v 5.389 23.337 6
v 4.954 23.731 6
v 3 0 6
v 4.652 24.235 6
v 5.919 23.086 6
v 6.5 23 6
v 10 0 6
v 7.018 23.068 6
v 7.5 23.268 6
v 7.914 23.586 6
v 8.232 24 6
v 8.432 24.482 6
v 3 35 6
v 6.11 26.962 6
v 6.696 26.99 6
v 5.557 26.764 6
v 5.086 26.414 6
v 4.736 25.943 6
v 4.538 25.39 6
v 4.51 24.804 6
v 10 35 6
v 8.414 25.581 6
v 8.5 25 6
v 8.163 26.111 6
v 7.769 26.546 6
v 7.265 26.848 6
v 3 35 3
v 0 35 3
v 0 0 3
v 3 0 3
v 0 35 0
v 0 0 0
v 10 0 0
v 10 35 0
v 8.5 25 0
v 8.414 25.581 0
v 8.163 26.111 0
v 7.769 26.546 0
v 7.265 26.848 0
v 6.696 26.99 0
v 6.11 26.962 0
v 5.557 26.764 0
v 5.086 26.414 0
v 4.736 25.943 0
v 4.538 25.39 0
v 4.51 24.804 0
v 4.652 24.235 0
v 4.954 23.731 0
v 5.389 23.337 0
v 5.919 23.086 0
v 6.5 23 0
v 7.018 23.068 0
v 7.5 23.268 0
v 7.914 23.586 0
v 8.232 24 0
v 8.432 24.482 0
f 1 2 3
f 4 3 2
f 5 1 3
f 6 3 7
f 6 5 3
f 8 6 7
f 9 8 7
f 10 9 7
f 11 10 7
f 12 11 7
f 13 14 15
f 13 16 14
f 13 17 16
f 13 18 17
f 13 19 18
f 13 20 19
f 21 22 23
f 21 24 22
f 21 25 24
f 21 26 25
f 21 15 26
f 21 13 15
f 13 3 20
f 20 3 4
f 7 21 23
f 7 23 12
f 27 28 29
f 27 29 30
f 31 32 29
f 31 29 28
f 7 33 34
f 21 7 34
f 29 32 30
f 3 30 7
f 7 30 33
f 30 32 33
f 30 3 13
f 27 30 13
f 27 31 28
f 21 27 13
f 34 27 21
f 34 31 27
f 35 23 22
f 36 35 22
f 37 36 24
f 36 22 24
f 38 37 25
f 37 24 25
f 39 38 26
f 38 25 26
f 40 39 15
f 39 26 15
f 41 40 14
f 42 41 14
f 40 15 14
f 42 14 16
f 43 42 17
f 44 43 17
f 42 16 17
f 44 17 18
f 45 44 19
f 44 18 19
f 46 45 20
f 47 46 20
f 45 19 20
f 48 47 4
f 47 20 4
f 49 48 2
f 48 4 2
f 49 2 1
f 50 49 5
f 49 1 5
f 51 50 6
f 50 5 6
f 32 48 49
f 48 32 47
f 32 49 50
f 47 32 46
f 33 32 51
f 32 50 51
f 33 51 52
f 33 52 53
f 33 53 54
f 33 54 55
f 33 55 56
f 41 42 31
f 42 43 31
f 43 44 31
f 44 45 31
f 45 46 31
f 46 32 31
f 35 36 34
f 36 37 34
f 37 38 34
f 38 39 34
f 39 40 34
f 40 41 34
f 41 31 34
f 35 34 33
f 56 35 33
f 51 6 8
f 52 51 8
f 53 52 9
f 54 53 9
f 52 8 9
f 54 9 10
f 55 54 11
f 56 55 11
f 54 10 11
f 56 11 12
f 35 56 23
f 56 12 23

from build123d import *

# Parameters (mm, degrees)
F0_W     = 10
F0_H     = 35
F1_DEPTH = 6
F2_W     = 3
F2_H     = 35
F3_DEPTH = 3
F5_DEPTH = 25


with BuildPart() as f1:
    # F0 (on Top) → F1 (new body)
    with BuildSketch(Plane.XY):
        with Locations((5, 17.5)):
            Rectangle(F0_W, F0_H)
    extrude(amount=F1_DEPTH)

    # F2 (on face) → F3 (cut)
    with BuildSketch(Plane.XY.offset(6)):
        with Locations((1.5, 17.5)):
            Rectangle(F2_W, F2_H)
    extrude(amount=-F3_DEPTH, mode=Mode.SUBTRACT)

    # F4 (on face) → F5 (cut)
    with BuildSketch(Plane.XY.offset(6)):
        with BuildLine():
            ThreePointArc((6.5, 23), (7.914214, 23.585786), (8.5, 25))
            ThreePointArc((8.5, 25), (5.085786, 26.414214), (6.5, 23))
        make_face()
    extrude(amount=-F5_DEPTH, mode=Mode.SUBTRACT)


solid = f1.part
